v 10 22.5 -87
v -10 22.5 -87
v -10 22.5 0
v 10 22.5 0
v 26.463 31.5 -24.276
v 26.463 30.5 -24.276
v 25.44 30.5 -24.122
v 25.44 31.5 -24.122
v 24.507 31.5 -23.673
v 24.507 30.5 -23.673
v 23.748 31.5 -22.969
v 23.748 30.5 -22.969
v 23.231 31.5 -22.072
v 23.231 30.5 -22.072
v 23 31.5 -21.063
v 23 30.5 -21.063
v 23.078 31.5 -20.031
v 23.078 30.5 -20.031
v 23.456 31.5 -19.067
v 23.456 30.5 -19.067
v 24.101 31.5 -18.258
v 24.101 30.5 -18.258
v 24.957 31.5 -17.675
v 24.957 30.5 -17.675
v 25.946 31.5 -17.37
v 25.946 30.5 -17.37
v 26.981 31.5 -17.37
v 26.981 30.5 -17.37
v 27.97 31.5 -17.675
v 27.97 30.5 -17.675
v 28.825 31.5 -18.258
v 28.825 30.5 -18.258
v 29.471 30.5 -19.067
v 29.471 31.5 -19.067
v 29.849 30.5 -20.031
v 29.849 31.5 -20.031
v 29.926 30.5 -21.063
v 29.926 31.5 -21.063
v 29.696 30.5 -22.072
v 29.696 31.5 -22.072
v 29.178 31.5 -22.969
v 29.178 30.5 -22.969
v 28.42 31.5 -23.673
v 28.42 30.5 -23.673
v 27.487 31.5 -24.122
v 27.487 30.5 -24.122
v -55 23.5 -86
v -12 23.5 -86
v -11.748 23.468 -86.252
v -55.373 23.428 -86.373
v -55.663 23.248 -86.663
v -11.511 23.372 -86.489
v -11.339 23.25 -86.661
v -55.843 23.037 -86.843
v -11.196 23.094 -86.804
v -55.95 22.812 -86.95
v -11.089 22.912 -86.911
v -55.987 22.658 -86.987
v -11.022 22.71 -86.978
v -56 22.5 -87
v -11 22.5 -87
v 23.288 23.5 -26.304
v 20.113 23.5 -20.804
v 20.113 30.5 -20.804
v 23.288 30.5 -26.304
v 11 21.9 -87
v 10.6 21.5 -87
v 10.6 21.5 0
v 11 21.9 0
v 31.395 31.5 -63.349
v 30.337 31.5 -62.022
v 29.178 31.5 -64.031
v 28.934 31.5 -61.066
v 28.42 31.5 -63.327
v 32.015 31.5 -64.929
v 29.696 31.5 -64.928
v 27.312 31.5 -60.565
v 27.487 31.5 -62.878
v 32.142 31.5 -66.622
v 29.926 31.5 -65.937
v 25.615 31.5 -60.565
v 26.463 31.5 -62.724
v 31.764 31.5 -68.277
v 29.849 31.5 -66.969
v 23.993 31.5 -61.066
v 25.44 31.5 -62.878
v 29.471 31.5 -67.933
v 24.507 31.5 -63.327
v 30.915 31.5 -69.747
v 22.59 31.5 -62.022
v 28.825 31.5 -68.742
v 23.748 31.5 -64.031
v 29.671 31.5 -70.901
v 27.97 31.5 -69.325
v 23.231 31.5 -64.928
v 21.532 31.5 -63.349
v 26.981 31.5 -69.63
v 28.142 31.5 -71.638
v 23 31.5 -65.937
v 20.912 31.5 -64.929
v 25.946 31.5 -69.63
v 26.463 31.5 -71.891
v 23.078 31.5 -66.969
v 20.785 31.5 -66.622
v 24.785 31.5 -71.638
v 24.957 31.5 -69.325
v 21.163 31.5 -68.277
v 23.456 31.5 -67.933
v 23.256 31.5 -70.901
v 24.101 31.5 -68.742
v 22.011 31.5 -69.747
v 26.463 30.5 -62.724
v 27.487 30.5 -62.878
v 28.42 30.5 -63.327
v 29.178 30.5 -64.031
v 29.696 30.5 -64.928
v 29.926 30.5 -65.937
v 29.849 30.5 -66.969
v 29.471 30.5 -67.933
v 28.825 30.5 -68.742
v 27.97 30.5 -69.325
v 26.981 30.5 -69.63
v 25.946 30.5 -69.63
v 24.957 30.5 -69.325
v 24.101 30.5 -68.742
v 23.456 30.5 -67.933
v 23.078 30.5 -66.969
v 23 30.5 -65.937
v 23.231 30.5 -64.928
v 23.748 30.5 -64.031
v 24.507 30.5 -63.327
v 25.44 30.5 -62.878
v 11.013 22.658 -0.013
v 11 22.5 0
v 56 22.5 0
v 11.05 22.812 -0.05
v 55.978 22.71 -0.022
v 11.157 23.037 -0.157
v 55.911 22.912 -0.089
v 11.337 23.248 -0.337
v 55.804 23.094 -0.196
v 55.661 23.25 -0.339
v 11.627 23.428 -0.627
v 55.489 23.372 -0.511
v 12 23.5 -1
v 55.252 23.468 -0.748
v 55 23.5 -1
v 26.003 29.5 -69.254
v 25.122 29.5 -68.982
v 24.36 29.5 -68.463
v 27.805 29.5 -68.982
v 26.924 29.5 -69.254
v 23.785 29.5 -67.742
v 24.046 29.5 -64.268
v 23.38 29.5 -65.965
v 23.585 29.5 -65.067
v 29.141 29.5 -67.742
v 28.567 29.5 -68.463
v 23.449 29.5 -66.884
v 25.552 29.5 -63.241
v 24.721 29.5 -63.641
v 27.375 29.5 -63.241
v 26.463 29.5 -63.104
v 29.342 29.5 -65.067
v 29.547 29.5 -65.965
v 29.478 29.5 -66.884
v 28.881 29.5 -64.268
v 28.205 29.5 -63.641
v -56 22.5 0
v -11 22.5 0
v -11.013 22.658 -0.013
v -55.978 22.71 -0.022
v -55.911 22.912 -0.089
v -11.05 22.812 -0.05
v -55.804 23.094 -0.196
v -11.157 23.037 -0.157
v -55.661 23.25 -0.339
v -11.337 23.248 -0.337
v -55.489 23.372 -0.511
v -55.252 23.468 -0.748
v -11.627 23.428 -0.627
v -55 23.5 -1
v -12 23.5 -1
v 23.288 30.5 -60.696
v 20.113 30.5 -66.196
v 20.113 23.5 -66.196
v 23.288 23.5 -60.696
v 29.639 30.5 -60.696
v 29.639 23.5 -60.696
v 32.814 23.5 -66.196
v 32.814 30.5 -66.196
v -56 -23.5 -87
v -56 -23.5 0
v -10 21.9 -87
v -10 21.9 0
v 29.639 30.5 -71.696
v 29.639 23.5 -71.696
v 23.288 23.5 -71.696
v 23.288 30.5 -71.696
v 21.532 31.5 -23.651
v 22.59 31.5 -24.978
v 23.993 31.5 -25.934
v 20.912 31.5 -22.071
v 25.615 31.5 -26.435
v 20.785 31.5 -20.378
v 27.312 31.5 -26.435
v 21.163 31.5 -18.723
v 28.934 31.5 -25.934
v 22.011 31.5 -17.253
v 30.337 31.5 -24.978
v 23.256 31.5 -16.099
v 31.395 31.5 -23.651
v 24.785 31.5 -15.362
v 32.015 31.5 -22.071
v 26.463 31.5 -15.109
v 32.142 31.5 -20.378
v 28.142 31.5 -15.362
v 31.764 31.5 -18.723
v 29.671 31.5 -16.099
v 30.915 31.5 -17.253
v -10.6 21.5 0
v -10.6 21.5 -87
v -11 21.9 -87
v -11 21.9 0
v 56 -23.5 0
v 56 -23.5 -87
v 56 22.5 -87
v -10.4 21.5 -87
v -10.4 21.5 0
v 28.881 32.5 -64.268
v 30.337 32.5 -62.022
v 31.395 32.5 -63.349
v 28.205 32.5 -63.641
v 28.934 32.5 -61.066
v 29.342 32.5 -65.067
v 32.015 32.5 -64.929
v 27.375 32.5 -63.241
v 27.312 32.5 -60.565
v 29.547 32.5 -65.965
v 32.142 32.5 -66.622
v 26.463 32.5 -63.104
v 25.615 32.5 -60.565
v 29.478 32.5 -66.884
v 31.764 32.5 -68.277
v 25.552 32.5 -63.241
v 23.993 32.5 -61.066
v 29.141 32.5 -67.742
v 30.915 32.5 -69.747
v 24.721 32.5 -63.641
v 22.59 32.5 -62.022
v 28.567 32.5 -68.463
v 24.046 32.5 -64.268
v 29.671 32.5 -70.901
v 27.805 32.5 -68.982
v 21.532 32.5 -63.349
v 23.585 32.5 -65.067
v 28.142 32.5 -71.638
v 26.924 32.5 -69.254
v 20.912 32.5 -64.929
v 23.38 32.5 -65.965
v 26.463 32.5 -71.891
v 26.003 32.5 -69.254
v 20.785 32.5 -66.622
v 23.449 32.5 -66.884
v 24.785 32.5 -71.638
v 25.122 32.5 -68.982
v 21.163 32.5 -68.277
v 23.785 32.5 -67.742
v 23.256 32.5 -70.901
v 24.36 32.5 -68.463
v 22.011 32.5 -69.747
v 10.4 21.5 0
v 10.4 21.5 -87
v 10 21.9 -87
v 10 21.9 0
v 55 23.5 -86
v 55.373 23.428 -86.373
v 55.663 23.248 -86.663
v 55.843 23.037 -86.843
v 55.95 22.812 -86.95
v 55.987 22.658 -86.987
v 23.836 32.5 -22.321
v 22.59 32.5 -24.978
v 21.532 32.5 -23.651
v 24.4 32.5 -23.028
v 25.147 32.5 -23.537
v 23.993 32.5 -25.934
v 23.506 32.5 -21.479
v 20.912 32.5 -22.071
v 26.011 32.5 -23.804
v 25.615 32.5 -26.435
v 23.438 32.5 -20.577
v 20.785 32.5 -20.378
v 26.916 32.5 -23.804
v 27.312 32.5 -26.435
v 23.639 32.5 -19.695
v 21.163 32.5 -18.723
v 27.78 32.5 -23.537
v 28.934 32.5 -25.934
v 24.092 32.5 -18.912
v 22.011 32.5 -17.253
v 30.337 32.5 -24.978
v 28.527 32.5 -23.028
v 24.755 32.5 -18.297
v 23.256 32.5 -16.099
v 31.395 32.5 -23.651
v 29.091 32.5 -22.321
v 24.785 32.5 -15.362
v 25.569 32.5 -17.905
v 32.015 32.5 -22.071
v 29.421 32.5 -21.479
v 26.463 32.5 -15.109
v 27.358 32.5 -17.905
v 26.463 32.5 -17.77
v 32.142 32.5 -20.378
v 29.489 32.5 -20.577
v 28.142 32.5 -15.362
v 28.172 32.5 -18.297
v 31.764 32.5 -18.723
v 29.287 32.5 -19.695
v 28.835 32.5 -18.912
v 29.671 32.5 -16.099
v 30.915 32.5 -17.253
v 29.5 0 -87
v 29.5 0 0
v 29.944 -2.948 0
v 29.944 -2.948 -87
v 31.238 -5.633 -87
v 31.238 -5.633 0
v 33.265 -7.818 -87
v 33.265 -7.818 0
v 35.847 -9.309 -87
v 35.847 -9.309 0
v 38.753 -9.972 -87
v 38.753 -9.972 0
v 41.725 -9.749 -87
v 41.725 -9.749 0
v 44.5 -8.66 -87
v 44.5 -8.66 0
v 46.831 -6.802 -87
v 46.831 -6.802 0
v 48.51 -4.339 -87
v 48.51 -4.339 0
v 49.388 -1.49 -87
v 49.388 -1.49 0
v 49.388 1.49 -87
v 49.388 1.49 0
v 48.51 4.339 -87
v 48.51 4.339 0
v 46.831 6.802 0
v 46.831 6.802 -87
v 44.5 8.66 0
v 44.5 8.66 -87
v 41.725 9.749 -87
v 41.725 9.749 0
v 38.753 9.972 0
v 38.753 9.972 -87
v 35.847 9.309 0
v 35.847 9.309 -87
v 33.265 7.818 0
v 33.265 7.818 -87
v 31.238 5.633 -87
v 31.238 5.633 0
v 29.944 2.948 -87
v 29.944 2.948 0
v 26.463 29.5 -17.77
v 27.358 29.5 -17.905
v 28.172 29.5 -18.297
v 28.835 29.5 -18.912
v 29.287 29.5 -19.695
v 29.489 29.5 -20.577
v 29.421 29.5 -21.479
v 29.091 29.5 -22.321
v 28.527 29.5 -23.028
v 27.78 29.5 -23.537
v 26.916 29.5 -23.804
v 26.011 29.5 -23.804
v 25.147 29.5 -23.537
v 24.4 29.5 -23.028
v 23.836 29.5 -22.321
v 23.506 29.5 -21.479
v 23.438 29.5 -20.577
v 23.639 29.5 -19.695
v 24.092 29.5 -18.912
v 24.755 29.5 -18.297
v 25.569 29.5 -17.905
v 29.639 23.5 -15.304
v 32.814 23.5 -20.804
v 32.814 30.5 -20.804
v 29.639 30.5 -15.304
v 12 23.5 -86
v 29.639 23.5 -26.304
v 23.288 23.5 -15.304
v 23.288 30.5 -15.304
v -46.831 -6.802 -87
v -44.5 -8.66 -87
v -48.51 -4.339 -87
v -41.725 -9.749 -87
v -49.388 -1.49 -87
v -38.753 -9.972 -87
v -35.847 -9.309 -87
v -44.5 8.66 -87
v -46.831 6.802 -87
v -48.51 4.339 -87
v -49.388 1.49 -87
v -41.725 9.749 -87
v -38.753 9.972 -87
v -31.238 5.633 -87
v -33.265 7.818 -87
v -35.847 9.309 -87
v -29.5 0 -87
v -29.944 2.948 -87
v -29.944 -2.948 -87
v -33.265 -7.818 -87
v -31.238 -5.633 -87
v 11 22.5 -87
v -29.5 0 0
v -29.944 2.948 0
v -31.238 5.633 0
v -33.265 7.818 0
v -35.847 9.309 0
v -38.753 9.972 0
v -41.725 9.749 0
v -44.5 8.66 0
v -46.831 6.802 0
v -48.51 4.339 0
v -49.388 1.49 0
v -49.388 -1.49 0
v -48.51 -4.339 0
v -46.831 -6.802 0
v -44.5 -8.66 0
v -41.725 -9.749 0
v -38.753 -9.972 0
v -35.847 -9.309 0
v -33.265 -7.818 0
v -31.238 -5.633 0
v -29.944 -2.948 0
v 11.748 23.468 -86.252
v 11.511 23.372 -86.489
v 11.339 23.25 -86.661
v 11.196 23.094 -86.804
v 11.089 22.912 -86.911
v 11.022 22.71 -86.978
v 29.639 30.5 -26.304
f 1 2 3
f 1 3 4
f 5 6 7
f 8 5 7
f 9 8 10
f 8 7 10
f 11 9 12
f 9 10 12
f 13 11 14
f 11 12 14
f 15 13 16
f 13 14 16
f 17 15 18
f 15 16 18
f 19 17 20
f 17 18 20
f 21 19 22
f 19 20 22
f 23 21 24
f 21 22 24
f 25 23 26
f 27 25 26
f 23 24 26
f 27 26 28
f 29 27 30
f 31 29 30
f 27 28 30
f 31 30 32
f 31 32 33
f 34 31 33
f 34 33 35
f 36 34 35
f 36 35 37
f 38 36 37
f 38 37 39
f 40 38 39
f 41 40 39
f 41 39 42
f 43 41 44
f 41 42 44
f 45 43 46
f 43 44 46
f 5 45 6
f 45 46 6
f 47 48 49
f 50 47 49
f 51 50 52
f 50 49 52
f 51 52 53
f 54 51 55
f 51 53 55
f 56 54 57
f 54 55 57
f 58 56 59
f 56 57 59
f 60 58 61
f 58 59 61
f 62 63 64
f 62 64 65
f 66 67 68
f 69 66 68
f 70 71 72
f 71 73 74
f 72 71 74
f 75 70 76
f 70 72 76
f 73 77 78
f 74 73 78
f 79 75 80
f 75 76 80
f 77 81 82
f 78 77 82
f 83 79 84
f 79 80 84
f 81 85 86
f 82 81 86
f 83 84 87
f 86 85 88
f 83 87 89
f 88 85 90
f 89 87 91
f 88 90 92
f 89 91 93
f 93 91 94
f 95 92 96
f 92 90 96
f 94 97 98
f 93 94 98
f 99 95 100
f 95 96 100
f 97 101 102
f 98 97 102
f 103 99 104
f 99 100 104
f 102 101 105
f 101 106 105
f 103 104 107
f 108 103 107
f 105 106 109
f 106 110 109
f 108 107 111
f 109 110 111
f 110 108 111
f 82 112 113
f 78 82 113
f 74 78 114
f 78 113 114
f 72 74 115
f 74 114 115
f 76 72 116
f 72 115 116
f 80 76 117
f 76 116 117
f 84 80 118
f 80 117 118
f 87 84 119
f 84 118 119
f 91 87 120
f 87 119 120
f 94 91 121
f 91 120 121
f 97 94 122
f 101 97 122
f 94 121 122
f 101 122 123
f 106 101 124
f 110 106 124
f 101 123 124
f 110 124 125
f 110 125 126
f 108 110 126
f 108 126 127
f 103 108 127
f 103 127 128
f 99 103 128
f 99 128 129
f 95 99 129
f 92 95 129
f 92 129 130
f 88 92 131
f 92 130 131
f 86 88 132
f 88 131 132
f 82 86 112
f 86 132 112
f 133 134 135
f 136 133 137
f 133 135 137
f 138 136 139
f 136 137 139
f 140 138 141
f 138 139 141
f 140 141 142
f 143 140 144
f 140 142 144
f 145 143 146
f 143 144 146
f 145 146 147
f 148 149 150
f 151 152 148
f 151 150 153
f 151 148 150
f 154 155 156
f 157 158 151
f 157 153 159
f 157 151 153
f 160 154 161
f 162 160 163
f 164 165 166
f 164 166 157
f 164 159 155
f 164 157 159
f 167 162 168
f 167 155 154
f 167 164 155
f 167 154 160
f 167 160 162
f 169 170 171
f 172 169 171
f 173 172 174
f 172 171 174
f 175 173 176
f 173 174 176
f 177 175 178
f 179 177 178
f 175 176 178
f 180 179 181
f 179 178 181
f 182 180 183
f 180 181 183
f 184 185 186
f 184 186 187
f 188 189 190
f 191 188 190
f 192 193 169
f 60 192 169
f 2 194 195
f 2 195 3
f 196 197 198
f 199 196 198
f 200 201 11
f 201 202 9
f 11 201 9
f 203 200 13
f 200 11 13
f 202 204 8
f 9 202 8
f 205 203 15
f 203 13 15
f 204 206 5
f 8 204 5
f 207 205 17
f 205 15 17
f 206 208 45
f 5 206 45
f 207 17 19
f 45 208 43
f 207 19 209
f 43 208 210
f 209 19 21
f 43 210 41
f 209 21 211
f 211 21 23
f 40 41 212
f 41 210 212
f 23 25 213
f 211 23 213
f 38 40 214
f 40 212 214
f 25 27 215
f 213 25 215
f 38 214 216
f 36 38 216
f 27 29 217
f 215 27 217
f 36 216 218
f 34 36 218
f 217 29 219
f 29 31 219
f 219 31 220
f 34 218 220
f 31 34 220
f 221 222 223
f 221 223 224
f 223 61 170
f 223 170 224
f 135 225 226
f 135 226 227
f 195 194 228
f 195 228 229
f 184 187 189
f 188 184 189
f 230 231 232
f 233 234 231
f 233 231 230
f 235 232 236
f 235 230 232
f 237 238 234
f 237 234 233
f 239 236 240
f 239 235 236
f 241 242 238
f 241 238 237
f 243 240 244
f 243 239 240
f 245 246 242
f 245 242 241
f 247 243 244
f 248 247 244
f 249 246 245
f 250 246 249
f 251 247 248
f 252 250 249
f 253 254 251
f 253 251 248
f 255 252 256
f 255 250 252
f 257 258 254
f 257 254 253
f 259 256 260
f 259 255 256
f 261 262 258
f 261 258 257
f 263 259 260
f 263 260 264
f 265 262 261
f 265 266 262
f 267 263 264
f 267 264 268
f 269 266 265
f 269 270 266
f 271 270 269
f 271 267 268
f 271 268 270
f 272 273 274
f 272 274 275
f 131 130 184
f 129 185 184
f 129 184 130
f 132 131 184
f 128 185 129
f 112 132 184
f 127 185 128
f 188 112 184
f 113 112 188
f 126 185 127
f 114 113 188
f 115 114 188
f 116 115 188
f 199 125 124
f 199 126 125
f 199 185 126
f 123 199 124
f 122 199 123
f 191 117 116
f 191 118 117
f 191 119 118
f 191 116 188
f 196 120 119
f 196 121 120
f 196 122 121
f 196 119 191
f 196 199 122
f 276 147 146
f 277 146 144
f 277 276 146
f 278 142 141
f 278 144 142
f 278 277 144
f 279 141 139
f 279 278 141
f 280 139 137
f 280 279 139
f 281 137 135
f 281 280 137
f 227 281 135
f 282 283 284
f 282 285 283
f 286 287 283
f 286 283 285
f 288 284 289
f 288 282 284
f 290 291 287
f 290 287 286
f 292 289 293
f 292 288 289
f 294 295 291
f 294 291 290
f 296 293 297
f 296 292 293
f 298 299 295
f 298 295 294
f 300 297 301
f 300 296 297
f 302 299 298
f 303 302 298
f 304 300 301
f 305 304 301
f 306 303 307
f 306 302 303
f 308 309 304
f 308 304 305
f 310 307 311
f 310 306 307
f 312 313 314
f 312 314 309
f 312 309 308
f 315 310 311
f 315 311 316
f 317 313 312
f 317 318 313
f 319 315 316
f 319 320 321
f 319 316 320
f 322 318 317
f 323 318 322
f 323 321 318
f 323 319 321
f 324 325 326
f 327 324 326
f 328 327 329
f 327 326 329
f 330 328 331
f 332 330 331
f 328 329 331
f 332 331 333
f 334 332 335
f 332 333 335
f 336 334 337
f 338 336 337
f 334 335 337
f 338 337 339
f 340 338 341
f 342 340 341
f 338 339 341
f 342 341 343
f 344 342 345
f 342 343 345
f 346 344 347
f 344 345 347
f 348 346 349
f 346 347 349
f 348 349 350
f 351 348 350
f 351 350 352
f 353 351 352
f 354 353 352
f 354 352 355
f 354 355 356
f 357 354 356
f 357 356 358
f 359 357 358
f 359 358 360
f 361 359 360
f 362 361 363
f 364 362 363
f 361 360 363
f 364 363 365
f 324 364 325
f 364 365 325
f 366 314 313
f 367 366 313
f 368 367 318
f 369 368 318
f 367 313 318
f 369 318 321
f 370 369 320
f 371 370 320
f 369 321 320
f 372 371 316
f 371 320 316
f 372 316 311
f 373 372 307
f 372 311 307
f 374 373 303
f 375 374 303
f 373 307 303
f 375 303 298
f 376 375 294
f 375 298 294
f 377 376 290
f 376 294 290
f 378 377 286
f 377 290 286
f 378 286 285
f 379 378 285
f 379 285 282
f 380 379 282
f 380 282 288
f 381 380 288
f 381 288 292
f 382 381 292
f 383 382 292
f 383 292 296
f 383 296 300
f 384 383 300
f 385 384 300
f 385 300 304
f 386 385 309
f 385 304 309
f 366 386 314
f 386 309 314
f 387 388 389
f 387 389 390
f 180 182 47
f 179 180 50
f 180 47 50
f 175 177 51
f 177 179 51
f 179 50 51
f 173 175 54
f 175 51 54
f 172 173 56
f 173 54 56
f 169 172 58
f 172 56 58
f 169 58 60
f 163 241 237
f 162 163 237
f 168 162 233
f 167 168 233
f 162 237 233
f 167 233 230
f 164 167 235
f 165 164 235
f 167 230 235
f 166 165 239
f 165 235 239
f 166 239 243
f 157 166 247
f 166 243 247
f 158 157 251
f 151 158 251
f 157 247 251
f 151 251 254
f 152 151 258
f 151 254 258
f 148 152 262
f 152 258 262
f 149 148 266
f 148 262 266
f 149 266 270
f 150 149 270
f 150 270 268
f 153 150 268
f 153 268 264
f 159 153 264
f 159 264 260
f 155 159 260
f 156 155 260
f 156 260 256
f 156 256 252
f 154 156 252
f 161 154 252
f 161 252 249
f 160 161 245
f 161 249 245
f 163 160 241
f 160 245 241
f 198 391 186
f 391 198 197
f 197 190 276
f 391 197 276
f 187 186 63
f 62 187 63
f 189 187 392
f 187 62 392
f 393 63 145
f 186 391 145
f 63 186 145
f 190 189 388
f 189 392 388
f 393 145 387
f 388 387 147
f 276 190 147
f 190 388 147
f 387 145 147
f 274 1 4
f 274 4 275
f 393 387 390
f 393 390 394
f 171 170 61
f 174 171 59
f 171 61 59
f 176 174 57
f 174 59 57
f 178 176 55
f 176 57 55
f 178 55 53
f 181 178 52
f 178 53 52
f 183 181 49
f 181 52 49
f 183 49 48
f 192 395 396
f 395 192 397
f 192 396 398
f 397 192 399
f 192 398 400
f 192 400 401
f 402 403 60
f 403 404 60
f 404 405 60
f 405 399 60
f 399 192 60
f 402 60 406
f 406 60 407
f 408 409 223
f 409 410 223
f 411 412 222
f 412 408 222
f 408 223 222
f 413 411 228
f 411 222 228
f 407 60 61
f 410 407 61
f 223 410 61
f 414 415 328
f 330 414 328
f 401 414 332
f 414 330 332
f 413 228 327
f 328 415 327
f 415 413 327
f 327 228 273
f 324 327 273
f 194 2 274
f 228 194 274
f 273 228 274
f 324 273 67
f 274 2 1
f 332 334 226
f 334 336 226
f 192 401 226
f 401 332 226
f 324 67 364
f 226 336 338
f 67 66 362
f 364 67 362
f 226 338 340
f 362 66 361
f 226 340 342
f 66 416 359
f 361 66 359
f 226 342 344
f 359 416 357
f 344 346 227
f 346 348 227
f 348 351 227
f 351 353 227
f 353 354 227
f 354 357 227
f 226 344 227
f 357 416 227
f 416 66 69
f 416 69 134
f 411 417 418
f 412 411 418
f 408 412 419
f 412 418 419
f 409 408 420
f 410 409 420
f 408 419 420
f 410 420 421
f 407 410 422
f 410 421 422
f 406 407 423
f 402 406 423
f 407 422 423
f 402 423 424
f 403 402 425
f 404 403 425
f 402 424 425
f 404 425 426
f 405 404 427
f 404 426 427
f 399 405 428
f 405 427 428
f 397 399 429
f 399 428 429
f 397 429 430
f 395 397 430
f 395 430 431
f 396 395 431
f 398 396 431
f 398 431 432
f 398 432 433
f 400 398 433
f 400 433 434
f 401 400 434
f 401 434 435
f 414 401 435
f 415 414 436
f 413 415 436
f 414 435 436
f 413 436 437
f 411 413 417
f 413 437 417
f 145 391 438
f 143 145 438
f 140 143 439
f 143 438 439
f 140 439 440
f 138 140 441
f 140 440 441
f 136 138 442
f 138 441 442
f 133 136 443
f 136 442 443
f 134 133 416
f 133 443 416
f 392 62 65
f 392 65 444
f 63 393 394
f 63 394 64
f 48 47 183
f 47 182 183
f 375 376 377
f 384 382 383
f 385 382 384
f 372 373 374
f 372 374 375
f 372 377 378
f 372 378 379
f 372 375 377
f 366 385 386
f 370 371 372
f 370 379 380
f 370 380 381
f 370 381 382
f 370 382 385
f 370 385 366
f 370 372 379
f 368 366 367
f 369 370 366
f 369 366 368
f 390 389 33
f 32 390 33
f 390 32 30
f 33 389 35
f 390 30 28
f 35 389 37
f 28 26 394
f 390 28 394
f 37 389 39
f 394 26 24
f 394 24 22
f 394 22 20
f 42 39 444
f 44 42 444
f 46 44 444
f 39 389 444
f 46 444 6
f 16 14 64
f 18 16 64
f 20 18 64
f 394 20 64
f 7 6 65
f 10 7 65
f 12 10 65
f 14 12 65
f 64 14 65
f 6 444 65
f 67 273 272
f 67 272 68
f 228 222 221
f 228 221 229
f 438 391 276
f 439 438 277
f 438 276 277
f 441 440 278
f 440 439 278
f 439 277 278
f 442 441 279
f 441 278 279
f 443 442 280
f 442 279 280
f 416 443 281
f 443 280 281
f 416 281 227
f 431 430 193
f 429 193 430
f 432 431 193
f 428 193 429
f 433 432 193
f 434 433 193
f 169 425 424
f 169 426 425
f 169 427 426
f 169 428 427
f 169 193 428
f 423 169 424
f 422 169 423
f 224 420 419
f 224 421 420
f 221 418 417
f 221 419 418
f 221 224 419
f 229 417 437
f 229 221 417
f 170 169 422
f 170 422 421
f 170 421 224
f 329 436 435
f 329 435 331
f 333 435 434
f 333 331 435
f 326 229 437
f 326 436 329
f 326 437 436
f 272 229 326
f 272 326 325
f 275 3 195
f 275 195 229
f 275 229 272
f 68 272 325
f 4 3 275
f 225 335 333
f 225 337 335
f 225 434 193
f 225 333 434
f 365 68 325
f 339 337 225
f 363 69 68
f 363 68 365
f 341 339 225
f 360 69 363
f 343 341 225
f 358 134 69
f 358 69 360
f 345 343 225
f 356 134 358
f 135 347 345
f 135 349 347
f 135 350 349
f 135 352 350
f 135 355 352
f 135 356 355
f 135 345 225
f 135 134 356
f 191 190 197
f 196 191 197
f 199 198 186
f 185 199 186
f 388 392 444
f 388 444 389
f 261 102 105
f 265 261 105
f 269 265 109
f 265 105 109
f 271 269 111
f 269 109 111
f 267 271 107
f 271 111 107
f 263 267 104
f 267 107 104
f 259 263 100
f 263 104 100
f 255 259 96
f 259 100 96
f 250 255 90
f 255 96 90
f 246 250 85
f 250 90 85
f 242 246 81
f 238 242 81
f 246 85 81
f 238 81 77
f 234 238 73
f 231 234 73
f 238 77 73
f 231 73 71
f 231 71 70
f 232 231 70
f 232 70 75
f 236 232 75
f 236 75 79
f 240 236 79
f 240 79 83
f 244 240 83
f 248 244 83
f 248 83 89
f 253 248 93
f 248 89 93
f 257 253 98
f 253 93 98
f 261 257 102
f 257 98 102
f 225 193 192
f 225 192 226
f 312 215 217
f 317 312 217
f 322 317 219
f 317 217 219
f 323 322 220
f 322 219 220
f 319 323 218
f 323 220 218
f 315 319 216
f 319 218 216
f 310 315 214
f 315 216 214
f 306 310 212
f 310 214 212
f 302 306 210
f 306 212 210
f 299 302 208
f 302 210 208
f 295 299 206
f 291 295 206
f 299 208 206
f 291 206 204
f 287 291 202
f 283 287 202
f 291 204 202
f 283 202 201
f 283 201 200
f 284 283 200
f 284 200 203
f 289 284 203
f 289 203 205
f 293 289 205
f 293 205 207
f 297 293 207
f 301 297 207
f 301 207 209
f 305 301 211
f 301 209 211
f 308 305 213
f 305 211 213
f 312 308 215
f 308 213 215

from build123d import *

# Parameters (mm, degrees)
CROQUIS1_W              = 112
CROQUIS1_H              = 47
SALIENTE_EXTRUIR1_DEPTH = 87
CROQUIS2_R              = 10
CORTAR_EXTRUIR1_DEPTH   = 87
CORTAR_EXTRUIR2_DEPTH   = 87
CHAFL_N1_SIZE           = 0.4
CHAFL_N2_SIZE           = 0.4
REDONDEO1_R             = 1
REDONDEO2_R             = 1
SALIENTE_EXTRUIR2_DEPTH = 7
CROQUIS6_R              = 3.472712807
SALIENTE_EXTRUIR3_DEPTH = 1
CROQUIS7_R              = 5.694419986
SALIENTE_EXTRUIR4_DEPTH = 1
CROQUIS8_R              = 3.033642273
CROQUIS8_R_2            = 3.0923226
CORTAR_EXTRUIR3_DEPTH   = 3


with BuildPart() as part:
    # Croquis1 → Saliente-Extruir1 (new body)
    with BuildSketch(Plane.XY):
        Rectangle(CROQUIS1_W, CROQUIS1_H)
    extrude(amount=-SALIENTE_EXTRUIR1_DEPTH)

    # Croquis2 → Cortar-Extruir1 (cut)
    with BuildSketch(Plane.XY):
        with Locations((-39.5, 0)):
            Circle(CROQUIS2_R)
        with Locations(Location((39.5, 0, 0), (0, 0, 180))):
            Circle(CROQUIS2_R)
    extrude(amount=-CORTAR_EXTRUIR1_DEPTH, mode=Mode.SUBTRACT)

    # Croquis4 → Cortar-Extruir2 (cut)
    with BuildSketch(Plane(origin=(0, 0, -87), x_dir=(-1, 0, 0), z_dir=(0, 0, -1))):
        Polygon((10, 22.5), (-10, 22.5), (-10, 21.5), (-11, 21.5), (-11, 23.5), (0, 25.805357454), (11, 23.5), (11, 21.5), (10, 21.5), align=None)
    extrude(amount=-CORTAR_EXTRUIR2_DEPTH, mode=Mode.SUBTRACT)

    # Chaflán1
    chafl_n1_edges = [part.edges().sort_by_distance(p)[0] for p in [
        (-11, 21.5, -43.5),
        (-10, 21.5, -43.5),
    ]]
    chamfer(chafl_n1_edges, length=CHAFL_N1_SIZE)

    # Chaflán2
    chafl_n2_edges = [part.edges().sort_by_distance(p)[0] for p in [
        (10, 21.5, -43.5),
        (11, 21.5, -43.5),
    ]]
    chamfer(chafl_n2_edges, length=CHAFL_N2_SIZE)

    # Redondeo1
    redondeo1_edges = [part.edges().sort_by_distance(p)[0] for p in [
        (-33.5, 23.5, 0),
        (-33.5, 23.5, -87),
        (33.5, 23.5, 0),
        (33.5, 23.5, -87),
        (-56, 23.5, -43.5),
        (56, 23.5, -43.5),
    ]]
    fillet(redondeo1_edges, radius=REDONDEO1_R)

    # Redondeo2
    # the kernel refuses this fillet: 1 mm, written as the material it takes off along each edge
    with BuildSketch(Plane(origin=(-11, 23.5, -88.5), x_dir=(0, -1, 0), z_dir=(0, 0, 1))) as redondeo2_piece_1:
        with BuildLine():
            CenterArc((REDONDEO2_R, -REDONDEO2_R), REDONDEO2_R, 90, 90)
            Line((0, -REDONDEO2_R), (0, 0))
            Line((0, 0), (REDONDEO2_R, 0))
        make_face()
    extrude(amount=90, mode=Mode.SUBTRACT)
    with BuildSketch(Plane(origin=(11, 23.5, -88.5), x_dir=(0, -1, 0), z_dir=(0, 0, 1))) as redondeo2_piece_2:
        with BuildLine():
            CenterArc((REDONDEO2_R, REDONDEO2_R), REDONDEO2_R, 180, 90)
            Line((0, REDONDEO2_R), (0, 0))
            Line((0, 0), (REDONDEO2_R, 0))
        make_face()
    extrude(amount=90, mode=Mode.SUBTRACT)

    # Croquis5 → Saliente-Extruir2 (add)
    with BuildSketch(Plane(origin=(0, 23.5, 0), x_dir=(1, 0, 0), z_dir=(0, 1, 0))):
        Polygon((32.814266538, 66.19625833), (29.638840058, 71.69625833), (23.287987096, 71.69625833), (20.112560616, 66.19625833), (23.287987096, 60.69625833), (29.638840058, 60.69625833), align=None)
        Polygon((29.638840058, 26.30374167), (32.814266538, 20.80374167), (29.638840058, 15.30374167), (23.287987096, 15.30374167), (20.112560616, 20.80374167), (23.287987096, 26.30374167), align=None)
    extrude(amount=SALIENTE_EXTRUIR2_DEPTH)

    # Croquis6 → Saliente-Extruir3 (add)
    with BuildSketch(Plane(origin=(0, 30.5, 0), x_dir=(1, 0, 0), z_dir=(0, 1, 0))):
        with Locations(Location((26.463413577, 66.19625833, 0), (0, 0, 270))):
            Circle(CROQUIS6_R)
        with Locations(Location((26.463413577, 20.80374167, 0), (0, 0, 90))):
            Circle(CROQUIS6_R)
    extrude(amount=SALIENTE_EXTRUIR3_DEPTH)

    # Croquis7 → Saliente-Extruir4 (add)
    with BuildSketch(Plane(origin=(0, 31.5, 0), x_dir=(1, 0, 0), z_dir=(0, 1, 0))):
        with Locations(Location((26.463413577, 20.80374167, 0), (0, 0, 270))):
            Circle(CROQUIS7_R)
        with Locations(Location((26.463413577, 66.19625833, 0), (0, 0, 90))):
            Circle(CROQUIS7_R)
    extrude(amount=SALIENTE_EXTRUIR4_DEPTH)

    # Croquis8 → Cortar-Extruir3 (cut)
    with BuildSketch(Plane(origin=(0, 32.5, 0), x_dir=(1, 0, 0), z_dir=(0, 1, 0))):
        with Locations(Location((26.463413577, 20.80374167, 0), (0, 0, 270))):
            Circle(CROQUIS8_R)
        with Locations(Location((26.463413577, 66.19625833, 0), (0, 0, 270))):
            Circle(CROQUIS8_R_2)
    extrude(amount=-CORTAR_EXTRUIR3_DEPTH, mode=Mode.SUBTRACT)


solid = part.part
